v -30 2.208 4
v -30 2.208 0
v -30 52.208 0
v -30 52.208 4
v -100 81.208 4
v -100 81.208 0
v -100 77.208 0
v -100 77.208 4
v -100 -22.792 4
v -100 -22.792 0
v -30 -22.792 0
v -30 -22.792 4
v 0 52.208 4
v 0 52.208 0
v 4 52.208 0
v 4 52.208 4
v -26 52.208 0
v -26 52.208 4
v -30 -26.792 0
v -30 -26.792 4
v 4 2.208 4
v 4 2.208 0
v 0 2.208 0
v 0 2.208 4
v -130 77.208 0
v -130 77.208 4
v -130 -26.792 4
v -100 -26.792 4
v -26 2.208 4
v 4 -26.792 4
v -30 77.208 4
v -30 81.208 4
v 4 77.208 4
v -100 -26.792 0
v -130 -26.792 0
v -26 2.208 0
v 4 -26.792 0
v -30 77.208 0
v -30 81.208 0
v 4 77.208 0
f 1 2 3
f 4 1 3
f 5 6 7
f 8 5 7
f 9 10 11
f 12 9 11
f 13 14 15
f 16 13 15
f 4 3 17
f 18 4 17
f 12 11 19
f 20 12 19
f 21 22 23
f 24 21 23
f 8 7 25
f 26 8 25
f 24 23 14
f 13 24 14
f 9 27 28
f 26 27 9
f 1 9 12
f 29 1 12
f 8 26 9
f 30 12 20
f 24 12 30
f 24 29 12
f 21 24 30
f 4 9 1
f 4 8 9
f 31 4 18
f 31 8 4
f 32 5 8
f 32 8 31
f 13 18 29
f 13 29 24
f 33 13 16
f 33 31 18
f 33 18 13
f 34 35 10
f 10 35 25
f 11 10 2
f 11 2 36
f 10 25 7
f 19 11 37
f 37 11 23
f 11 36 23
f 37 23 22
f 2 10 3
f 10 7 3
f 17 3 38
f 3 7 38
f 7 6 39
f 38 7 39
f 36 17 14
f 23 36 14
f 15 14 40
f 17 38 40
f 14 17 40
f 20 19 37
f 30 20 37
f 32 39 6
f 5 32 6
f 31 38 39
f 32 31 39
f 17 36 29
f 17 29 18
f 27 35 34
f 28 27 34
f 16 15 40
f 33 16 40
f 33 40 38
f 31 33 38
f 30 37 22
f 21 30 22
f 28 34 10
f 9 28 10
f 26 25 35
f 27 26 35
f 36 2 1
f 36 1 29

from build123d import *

# Parameters (mm, degrees)
SKETCH_1_W      = 4
SKETCH_1_H      = 50
EXTRUDE_1_DEPTH = 4


with BuildPart() as part:
    # Эскиз1 → Бобышка-Вытянуть1 (new body)
    with BuildSketch(Plane.XY):
        Polygon((-100, 77.20842051), (-130, 77.20842051), (-130, -22.79157949), (-130, -26.79157949), (-100, -26.79157949), (-100, -22.79157949), (-30, -22.79157949), (-30, -26.79157949), (0, -26.79157949), (4, -26.79157949), (4, 2.20842051), (0, 2.20842051), (0, 52.20842051), (4, 52.20842051), (4, 77.20842051), (0, 77.20842051), (-30, 77.20842051), (-30, 81.20842051), (-100, 81.20842051), align=None)
        with Locations((-28, 27.20842051)):
            Rectangle(SKETCH_1_W, SKETCH_1_H, mode=Mode.SUBTRACT)
    extrude(amount=EXTRUDE_1_DEPTH)


solid = part.part
